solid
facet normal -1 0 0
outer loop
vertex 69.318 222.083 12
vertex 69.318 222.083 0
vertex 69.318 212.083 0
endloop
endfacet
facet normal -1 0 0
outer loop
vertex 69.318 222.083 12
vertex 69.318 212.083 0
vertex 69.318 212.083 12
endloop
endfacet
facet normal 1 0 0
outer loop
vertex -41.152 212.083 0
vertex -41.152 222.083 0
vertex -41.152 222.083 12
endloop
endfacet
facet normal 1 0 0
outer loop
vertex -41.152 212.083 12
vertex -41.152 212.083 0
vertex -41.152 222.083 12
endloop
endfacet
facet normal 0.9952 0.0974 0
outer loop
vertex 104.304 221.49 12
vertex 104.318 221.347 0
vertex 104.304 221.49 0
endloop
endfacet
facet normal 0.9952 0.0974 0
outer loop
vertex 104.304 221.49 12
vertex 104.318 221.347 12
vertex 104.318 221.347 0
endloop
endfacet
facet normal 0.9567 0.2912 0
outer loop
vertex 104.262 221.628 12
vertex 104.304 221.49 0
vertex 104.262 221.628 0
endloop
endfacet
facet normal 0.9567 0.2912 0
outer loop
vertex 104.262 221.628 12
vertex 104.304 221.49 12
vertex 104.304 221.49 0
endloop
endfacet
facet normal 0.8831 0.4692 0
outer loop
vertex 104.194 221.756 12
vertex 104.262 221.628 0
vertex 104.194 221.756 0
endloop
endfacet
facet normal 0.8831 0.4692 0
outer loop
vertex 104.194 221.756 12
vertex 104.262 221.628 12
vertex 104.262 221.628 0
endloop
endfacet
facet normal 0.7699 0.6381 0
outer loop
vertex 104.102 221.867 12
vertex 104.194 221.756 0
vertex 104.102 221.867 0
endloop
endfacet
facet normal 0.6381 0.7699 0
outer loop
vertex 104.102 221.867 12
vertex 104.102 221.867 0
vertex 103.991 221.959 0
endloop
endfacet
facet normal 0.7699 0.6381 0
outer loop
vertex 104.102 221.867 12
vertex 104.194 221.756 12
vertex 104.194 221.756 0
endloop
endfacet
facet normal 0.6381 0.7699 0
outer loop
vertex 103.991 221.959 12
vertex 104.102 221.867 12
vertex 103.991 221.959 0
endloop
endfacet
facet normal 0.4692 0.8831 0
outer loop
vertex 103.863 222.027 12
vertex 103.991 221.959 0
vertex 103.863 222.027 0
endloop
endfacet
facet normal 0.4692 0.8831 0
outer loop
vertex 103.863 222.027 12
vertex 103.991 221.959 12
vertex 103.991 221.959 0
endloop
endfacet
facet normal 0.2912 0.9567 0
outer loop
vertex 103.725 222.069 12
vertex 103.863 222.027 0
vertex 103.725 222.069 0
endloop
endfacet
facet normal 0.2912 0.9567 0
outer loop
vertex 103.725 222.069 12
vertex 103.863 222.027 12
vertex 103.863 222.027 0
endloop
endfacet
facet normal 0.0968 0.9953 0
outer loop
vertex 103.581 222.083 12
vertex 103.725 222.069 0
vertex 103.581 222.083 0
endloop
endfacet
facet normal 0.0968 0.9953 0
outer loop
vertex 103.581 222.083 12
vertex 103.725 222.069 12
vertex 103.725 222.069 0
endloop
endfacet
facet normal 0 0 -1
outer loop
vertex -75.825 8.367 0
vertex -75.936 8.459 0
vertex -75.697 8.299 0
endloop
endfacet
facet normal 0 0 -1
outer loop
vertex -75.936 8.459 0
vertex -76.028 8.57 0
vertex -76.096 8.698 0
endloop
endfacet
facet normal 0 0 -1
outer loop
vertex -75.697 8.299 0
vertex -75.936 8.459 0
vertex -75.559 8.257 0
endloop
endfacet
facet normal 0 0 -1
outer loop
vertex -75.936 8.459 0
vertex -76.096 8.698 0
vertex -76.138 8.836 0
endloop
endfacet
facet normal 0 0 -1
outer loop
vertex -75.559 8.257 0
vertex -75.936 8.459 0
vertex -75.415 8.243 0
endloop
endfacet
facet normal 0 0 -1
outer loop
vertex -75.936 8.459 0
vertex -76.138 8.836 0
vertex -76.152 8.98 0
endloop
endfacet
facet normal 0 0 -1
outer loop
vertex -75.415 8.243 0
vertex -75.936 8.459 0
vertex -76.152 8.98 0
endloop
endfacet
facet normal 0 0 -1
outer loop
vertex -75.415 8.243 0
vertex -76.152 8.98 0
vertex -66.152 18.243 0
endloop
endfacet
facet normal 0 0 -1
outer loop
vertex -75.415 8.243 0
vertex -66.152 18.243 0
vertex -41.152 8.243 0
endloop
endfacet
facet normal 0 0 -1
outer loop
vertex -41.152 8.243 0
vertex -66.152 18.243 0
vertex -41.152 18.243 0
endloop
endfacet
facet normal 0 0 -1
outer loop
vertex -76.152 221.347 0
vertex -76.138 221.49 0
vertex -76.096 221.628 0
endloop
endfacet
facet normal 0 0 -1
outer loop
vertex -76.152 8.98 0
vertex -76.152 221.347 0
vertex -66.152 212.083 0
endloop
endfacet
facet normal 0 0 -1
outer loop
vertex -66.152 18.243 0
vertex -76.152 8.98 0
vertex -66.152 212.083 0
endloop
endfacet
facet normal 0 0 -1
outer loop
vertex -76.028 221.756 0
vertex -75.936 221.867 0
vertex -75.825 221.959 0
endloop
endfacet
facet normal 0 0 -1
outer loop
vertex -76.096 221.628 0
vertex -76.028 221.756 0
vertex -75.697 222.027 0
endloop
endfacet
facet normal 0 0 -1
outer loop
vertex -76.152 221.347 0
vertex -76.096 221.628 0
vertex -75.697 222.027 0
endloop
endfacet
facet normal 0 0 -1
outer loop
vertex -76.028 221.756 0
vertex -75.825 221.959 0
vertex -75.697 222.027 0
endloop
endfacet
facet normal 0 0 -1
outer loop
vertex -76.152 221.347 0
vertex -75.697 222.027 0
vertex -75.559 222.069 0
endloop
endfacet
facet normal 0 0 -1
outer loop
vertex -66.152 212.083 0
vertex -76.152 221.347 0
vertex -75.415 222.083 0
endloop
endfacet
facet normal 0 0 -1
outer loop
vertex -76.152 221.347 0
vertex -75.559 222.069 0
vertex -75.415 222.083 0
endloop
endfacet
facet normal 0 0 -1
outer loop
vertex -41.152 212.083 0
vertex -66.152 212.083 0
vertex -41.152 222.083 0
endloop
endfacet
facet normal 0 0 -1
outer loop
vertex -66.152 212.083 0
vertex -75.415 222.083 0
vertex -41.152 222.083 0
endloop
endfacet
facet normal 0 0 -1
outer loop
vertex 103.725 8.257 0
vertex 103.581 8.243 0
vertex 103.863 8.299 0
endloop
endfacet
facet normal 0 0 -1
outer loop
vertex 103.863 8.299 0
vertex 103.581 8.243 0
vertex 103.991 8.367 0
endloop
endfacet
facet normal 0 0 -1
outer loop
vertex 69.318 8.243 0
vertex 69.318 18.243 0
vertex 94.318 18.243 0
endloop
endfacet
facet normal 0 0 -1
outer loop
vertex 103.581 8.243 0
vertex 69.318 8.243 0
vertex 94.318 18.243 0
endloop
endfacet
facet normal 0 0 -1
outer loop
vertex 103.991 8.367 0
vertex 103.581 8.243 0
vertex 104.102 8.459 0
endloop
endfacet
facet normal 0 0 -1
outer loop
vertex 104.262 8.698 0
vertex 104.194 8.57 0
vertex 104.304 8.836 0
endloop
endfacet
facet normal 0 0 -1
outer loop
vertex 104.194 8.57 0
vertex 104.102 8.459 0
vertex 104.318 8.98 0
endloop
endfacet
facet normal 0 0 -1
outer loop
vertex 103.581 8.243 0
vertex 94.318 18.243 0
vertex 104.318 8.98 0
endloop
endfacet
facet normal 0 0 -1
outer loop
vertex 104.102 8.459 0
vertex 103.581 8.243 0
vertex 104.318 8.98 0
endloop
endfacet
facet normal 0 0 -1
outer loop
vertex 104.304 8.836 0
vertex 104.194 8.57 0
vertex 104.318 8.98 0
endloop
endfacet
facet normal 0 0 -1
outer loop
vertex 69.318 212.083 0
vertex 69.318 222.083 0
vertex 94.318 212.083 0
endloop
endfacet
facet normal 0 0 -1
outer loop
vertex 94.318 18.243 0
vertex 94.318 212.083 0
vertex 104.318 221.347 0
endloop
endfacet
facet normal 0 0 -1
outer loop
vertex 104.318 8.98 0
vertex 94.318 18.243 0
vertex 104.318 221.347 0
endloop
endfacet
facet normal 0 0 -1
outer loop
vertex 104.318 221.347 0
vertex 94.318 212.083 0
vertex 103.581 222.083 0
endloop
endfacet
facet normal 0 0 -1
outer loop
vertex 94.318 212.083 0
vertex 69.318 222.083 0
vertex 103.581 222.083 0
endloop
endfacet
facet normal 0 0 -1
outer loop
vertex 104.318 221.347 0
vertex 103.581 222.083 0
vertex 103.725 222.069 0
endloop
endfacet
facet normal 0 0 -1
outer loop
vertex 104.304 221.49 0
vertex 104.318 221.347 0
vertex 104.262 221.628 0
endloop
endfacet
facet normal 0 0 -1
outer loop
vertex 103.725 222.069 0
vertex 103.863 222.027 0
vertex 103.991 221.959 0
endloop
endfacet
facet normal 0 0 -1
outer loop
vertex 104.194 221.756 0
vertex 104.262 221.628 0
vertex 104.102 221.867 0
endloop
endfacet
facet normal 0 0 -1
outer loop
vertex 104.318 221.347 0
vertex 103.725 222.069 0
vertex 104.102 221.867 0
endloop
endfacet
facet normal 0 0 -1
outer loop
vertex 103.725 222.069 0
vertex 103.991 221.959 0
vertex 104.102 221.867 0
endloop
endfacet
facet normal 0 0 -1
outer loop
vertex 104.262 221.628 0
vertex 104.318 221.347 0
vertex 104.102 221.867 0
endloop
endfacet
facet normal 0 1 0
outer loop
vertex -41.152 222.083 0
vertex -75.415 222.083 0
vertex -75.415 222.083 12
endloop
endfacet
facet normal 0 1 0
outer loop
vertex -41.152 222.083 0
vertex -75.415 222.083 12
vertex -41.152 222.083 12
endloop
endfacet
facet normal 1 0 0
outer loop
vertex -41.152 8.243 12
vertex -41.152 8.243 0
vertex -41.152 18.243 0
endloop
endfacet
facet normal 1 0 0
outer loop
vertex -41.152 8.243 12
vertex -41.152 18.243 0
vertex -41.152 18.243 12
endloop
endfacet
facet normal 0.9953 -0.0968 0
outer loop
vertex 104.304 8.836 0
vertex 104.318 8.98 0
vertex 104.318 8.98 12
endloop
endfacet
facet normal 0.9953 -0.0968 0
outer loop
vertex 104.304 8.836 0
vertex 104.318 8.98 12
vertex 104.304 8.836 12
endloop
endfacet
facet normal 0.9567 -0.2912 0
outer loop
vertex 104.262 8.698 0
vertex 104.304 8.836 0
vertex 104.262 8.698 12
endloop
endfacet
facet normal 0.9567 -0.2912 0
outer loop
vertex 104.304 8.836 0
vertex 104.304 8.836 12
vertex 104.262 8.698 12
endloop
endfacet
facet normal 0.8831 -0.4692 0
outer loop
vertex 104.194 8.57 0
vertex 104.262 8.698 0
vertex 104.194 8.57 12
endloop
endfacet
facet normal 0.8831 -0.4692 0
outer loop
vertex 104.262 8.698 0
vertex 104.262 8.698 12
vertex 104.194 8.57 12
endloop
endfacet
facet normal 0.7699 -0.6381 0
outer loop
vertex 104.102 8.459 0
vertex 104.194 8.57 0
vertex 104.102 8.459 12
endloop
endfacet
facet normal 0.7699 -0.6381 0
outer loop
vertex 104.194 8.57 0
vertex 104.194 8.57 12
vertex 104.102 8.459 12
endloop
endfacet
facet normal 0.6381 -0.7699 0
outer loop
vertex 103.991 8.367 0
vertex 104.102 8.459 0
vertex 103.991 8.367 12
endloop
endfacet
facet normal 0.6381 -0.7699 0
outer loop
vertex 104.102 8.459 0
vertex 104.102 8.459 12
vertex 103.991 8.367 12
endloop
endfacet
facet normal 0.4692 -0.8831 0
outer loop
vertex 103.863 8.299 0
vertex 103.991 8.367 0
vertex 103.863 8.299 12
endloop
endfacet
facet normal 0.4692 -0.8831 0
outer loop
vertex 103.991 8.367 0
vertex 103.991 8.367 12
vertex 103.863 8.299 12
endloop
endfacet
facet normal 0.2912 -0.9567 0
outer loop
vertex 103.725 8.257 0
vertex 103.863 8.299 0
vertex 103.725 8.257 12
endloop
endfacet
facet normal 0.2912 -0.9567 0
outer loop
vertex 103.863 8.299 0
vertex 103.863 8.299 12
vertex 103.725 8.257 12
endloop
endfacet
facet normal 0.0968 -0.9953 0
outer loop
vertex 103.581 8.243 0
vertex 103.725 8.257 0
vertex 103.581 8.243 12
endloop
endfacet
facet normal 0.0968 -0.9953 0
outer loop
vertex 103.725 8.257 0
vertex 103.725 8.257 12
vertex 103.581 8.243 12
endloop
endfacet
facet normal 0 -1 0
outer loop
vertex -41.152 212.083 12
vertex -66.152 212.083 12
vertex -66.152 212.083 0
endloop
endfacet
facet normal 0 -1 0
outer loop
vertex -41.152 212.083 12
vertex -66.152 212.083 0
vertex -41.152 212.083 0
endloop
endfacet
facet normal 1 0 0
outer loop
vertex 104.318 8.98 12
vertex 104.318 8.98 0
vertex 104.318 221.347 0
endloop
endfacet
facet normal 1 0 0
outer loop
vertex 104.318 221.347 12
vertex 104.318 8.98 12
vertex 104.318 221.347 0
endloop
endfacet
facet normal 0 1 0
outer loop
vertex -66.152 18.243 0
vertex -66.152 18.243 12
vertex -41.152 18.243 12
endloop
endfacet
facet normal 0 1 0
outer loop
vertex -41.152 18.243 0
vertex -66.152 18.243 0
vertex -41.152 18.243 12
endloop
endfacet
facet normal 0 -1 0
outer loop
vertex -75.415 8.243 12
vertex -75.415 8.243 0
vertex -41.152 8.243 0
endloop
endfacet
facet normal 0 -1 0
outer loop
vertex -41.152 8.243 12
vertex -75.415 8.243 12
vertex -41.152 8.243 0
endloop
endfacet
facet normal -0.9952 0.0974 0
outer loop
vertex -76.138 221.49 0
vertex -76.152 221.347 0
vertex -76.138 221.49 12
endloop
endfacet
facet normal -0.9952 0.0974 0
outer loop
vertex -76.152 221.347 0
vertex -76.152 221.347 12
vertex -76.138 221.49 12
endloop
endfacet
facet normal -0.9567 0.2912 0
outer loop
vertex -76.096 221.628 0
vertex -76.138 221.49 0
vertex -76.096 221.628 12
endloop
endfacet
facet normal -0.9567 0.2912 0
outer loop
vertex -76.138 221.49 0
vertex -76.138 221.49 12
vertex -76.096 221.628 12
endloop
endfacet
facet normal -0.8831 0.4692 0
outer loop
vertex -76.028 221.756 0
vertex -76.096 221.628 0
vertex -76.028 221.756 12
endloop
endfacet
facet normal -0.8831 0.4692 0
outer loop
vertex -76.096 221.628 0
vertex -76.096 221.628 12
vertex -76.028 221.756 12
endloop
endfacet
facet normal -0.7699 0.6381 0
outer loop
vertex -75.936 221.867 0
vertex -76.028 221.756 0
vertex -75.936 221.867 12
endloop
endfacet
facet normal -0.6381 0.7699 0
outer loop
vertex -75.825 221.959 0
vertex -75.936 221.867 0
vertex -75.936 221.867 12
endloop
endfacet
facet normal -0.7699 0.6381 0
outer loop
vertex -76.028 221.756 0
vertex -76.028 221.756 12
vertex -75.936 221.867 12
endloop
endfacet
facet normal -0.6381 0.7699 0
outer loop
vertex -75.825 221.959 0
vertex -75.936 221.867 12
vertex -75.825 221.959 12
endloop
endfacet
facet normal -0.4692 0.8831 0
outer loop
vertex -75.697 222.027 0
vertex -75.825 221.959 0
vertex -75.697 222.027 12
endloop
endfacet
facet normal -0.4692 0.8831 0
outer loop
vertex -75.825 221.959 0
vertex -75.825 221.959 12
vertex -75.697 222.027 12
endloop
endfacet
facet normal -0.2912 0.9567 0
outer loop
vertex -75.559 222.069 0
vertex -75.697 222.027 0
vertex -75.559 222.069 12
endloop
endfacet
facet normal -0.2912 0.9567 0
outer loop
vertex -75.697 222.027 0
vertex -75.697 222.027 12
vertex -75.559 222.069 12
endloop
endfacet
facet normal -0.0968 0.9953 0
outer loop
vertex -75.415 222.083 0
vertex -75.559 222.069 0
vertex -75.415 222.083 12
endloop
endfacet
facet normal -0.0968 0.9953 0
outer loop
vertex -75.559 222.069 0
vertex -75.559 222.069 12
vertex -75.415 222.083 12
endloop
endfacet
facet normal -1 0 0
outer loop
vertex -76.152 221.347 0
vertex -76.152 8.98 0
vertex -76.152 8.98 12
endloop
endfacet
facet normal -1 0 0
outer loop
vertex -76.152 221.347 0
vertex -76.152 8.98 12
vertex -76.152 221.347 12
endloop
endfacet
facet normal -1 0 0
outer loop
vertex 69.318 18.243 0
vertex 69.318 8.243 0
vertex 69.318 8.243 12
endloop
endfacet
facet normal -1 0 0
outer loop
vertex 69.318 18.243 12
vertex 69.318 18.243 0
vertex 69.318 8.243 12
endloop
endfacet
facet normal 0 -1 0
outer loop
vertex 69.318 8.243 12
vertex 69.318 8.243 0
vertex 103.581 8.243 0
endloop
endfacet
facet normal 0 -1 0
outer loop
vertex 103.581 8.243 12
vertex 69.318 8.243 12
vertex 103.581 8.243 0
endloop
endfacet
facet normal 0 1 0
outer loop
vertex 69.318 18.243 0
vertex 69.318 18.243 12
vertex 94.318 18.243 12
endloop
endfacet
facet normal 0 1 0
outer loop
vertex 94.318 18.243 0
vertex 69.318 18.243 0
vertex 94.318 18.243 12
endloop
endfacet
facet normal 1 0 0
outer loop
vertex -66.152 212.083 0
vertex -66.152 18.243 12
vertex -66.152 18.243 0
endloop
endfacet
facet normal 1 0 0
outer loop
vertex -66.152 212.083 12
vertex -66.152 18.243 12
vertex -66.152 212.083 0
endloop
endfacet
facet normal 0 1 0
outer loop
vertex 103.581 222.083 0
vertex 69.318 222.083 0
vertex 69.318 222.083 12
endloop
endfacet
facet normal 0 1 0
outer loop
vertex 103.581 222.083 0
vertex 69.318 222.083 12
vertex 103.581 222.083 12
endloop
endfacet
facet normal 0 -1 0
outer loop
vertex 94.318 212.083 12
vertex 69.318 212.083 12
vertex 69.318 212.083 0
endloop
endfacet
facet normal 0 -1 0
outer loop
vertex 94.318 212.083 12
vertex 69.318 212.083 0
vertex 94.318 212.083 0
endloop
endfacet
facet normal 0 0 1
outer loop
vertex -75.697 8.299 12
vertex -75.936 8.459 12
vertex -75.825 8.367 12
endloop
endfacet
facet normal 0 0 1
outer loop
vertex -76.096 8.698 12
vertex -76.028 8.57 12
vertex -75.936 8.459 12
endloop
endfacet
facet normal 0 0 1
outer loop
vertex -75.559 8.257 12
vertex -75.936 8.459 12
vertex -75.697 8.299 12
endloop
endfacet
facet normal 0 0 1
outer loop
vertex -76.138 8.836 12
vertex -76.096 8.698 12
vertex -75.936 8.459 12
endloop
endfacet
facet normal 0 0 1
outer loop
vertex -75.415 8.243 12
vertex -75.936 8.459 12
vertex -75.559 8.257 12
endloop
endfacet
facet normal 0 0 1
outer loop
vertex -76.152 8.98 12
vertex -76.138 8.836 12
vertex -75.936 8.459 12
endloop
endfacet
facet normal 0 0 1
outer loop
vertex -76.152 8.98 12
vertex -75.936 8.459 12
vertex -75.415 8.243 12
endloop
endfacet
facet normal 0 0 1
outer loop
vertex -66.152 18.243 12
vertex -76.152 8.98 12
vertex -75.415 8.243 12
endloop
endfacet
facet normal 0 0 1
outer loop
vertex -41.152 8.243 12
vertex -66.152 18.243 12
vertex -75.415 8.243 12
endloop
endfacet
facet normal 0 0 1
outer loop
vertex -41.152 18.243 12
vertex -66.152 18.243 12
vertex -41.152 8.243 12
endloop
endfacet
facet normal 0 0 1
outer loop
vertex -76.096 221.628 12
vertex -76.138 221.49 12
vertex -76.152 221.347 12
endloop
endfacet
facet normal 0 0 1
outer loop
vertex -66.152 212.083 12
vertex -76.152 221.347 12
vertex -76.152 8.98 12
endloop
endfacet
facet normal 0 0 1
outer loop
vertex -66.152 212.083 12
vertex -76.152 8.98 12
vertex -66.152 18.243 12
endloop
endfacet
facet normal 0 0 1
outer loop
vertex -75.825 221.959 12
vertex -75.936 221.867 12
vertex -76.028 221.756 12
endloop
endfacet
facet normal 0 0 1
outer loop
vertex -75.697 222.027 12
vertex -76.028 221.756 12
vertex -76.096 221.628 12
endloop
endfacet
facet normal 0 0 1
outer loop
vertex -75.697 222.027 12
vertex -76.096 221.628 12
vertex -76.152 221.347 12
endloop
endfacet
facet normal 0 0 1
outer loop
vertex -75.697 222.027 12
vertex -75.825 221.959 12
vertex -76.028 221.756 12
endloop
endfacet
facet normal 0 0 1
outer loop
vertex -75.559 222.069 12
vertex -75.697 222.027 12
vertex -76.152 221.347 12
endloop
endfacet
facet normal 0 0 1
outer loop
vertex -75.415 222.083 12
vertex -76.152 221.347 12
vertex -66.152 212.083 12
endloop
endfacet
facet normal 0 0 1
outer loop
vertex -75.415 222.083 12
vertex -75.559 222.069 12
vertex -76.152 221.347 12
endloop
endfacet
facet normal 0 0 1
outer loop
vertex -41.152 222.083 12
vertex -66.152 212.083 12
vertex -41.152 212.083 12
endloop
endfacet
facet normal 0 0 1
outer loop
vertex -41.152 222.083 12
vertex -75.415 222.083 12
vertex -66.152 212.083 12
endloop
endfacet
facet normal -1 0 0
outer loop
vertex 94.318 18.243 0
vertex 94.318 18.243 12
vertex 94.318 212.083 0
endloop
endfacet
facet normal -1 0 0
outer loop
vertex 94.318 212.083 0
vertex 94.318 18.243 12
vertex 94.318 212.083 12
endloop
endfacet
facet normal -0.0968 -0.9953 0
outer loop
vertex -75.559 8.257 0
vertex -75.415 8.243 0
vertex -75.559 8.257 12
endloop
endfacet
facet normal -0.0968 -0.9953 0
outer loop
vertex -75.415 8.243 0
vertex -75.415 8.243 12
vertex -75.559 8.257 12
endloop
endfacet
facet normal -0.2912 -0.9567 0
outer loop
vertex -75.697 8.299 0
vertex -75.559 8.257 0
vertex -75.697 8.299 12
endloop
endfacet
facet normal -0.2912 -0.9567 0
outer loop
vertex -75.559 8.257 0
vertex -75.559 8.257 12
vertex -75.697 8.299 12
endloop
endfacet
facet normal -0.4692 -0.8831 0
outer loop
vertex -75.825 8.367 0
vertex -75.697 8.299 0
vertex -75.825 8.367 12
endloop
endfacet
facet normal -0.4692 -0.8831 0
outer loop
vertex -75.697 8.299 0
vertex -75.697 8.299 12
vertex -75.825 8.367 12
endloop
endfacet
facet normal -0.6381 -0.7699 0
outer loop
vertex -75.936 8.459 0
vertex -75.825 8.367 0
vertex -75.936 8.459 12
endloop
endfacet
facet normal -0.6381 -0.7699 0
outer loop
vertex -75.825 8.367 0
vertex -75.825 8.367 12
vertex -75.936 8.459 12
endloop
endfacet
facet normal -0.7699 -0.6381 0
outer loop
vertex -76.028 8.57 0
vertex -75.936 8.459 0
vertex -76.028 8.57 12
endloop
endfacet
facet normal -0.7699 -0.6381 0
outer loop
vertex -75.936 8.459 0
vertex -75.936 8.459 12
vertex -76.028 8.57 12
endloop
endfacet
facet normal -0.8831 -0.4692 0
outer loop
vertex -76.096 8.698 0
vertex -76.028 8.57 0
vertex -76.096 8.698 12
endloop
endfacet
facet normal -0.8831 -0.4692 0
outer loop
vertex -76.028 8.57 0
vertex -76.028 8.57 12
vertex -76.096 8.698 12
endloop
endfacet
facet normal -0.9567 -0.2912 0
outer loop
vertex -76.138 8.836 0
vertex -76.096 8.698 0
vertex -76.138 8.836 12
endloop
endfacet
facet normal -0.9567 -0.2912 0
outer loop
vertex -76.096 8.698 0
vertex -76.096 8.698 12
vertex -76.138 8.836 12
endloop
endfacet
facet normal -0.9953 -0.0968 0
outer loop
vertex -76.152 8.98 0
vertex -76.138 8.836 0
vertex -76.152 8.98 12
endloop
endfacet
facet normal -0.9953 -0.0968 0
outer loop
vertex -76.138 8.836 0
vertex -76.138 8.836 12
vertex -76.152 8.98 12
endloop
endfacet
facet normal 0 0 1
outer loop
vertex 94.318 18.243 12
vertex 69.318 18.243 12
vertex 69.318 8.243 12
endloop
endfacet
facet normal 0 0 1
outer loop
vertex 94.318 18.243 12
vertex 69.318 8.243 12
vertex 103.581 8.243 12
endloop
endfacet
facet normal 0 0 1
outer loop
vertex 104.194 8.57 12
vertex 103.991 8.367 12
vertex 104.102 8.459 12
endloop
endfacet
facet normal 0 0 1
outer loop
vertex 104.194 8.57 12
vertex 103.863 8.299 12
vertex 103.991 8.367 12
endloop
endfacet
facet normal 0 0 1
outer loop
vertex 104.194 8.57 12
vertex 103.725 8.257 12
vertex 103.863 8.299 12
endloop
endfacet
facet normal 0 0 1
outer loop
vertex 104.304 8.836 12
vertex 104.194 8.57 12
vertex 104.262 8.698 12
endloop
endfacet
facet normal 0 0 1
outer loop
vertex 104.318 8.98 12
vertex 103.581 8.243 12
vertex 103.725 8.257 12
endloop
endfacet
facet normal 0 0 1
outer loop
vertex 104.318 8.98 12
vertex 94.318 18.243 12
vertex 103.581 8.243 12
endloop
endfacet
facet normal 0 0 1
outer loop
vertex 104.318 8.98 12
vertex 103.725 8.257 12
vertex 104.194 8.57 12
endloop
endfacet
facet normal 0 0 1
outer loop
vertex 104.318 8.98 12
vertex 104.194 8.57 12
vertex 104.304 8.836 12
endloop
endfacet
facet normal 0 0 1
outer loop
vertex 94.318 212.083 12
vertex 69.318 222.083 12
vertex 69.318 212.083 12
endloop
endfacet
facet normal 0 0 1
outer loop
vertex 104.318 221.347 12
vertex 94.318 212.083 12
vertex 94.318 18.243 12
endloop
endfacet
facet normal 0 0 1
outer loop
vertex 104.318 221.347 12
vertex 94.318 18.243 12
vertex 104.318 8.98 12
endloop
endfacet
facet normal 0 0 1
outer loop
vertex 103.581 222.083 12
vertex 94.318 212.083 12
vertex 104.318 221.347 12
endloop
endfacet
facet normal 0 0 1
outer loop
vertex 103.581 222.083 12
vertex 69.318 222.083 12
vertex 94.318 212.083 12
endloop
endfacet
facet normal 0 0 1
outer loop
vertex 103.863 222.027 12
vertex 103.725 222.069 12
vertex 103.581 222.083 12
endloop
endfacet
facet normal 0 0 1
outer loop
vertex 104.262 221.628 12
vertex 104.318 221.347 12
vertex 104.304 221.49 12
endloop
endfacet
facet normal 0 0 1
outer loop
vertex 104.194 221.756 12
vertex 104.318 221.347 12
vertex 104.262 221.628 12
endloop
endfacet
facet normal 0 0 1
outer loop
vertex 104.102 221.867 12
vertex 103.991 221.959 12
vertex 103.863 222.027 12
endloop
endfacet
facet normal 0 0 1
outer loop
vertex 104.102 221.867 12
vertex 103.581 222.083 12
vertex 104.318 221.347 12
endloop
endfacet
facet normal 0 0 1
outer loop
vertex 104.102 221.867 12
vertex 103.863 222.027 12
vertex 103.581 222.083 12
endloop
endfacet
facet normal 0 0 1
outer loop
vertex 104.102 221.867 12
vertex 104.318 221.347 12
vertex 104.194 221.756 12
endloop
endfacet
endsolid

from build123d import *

# Parameters (mm, degrees)
ESBO_O1_W                = 180.47
ESBO_O1_H                = 213.84
RESSALTO_EXTRUS_O1_DEPTH = 12
FILETE2_R                = 0.7366
FILETE3_R                = 0.7366
FILETE4_R                = 0.7366
FILETE5_R                = 0.7366
CORTE_EXTRUS_O1_REACH    = 247.657
ESBO_O2_W                = 160.47
ESBO_O2_H                = 193.84
CORTE_EXTRUS_O2_REACH    = 240.231
ESBO_O5_W                = 110.47
ESBO_O5_H                = 12
CORTE_EXTRUS_O3_REACH    = 240.231
ESBO_O6_W                = 110.47
ESBO_O6_H                = 12


with BuildPart() as part:
    # Esboço1 → Ressalto-extrusão1 (new body)
    with BuildSketch(Plane.XY):
        with Locations((14.08297041, 115.163100963)):
            Rectangle(ESBO_O1_W, ESBO_O1_H)
    extrude(amount=RESSALTO_EXTRUS_O1_DEPTH)

    # Filete2
    filete2_edges = [part.edges().sort_by_distance(p)[0] for p in [
        (104.31797041, 222.083100963, 6),
    ]]
    fillet(filete2_edges, radius=FILETE2_R)

    # Filete3
    filete3_edges = [part.edges().sort_by_distance(p)[0] for p in [
        (104.31797041, 8.243100963, 6),
    ]]
    fillet(filete3_edges, radius=FILETE3_R)

    # Filete4
    filete4_edges = [part.edges().sort_by_distance(p)[0] for p in [
        (-76.15202959, 8.243100963, 6),
    ]]
    fillet(filete4_edges, radius=FILETE4_R)

    # Filete5
    filete5_edges = [part.edges().sort_by_distance(p)[0] for p in [
        (-76.15202959, 222.083100963, 6),
    ]]
    fillet(filete5_edges, radius=FILETE5_R)

    # Esboço2 → Corte-extrusão1 (cut, up to next)
    with BuildSketch(Plane.XY.offset(12), mode=Mode.PRIVATE) as corte_extrus_o1_sk1:
        with Locations((14.08297041, 115.163100963)):
            Rectangle(ESBO_O2_W, ESBO_O2_H)
    corte_extrus_o1_tool1 = extrude(corte_extrus_o1_sk1.sketch, amount=-CORTE_EXTRUS_O1_REACH, mode=Mode.PRIVATE) & part.part
    add(corte_extrus_o1_tool1.solids().sort_by_distance((14.08297, 115.163101, 12))[0], mode=Mode.SUBTRACT)

    # Esboço5 → Corte-extrusão2 (cut, up to next)
    with BuildSketch(Plane(origin=(0, 222.083100963, 0), x_dir=(-1, 0, 0), z_dir=(0, 1, 0)), mode=Mode.PRIVATE) as corte_extrus_o2_sk1:
        with Locations((-14.08297041, 6)):
            Rectangle(ESBO_O5_W, ESBO_O5_H)
    corte_extrus_o2_tool1 = extrude(corte_extrus_o2_sk1.sketch, amount=-CORTE_EXTRUS_O2_REACH, mode=Mode.PRIVATE) & part.part
    add(corte_extrus_o2_tool1.solids().sort_by_distance((14.08297, 222.083101, 6))[0], mode=Mode.SUBTRACT)

    # Esboço6 → Corte-extrusão3 (cut, up to next)
    with BuildSketch(Plane.XZ.offset(-8.243100963), mode=Mode.PRIVATE) as corte_extrus_o3_sk1:
        with Locations((14.08297041, 6)):
            Rectangle(ESBO_O6_W, ESBO_O6_H)
    corte_extrus_o3_tool1 = extrude(corte_extrus_o3_sk1.sketch, amount=-CORTE_EXTRUS_O3_REACH, mode=Mode.PRIVATE) & part.part
    add(corte_extrus_o3_tool1.solids().sort_by_distance((14.08297, 8.243101, 6))[0], mode=Mode.SUBTRACT)


with BuildPart() as corte_extrus_o3_piece_1:
    # of the separate pieces the step leaves, piece 1, a body of its own (corte_extrus_o3_pieces)
    add(part.part.solids().sort_by_distance((-76.15202959, 221.346500963, 0))[0])


with BuildPart() as corte_extrus_o3_piece_2:
    # of the separate pieces the step leaves, piece 2, a body of its own (corte_extrus_o3_pieces)
    add(part.part.solids().sort_by_distance((103.58137041, 8.243100963, 0))[0])


solid = Compound([corte_extrus_o3_piece_1.part, corte_extrus_o3_piece_2.part])
